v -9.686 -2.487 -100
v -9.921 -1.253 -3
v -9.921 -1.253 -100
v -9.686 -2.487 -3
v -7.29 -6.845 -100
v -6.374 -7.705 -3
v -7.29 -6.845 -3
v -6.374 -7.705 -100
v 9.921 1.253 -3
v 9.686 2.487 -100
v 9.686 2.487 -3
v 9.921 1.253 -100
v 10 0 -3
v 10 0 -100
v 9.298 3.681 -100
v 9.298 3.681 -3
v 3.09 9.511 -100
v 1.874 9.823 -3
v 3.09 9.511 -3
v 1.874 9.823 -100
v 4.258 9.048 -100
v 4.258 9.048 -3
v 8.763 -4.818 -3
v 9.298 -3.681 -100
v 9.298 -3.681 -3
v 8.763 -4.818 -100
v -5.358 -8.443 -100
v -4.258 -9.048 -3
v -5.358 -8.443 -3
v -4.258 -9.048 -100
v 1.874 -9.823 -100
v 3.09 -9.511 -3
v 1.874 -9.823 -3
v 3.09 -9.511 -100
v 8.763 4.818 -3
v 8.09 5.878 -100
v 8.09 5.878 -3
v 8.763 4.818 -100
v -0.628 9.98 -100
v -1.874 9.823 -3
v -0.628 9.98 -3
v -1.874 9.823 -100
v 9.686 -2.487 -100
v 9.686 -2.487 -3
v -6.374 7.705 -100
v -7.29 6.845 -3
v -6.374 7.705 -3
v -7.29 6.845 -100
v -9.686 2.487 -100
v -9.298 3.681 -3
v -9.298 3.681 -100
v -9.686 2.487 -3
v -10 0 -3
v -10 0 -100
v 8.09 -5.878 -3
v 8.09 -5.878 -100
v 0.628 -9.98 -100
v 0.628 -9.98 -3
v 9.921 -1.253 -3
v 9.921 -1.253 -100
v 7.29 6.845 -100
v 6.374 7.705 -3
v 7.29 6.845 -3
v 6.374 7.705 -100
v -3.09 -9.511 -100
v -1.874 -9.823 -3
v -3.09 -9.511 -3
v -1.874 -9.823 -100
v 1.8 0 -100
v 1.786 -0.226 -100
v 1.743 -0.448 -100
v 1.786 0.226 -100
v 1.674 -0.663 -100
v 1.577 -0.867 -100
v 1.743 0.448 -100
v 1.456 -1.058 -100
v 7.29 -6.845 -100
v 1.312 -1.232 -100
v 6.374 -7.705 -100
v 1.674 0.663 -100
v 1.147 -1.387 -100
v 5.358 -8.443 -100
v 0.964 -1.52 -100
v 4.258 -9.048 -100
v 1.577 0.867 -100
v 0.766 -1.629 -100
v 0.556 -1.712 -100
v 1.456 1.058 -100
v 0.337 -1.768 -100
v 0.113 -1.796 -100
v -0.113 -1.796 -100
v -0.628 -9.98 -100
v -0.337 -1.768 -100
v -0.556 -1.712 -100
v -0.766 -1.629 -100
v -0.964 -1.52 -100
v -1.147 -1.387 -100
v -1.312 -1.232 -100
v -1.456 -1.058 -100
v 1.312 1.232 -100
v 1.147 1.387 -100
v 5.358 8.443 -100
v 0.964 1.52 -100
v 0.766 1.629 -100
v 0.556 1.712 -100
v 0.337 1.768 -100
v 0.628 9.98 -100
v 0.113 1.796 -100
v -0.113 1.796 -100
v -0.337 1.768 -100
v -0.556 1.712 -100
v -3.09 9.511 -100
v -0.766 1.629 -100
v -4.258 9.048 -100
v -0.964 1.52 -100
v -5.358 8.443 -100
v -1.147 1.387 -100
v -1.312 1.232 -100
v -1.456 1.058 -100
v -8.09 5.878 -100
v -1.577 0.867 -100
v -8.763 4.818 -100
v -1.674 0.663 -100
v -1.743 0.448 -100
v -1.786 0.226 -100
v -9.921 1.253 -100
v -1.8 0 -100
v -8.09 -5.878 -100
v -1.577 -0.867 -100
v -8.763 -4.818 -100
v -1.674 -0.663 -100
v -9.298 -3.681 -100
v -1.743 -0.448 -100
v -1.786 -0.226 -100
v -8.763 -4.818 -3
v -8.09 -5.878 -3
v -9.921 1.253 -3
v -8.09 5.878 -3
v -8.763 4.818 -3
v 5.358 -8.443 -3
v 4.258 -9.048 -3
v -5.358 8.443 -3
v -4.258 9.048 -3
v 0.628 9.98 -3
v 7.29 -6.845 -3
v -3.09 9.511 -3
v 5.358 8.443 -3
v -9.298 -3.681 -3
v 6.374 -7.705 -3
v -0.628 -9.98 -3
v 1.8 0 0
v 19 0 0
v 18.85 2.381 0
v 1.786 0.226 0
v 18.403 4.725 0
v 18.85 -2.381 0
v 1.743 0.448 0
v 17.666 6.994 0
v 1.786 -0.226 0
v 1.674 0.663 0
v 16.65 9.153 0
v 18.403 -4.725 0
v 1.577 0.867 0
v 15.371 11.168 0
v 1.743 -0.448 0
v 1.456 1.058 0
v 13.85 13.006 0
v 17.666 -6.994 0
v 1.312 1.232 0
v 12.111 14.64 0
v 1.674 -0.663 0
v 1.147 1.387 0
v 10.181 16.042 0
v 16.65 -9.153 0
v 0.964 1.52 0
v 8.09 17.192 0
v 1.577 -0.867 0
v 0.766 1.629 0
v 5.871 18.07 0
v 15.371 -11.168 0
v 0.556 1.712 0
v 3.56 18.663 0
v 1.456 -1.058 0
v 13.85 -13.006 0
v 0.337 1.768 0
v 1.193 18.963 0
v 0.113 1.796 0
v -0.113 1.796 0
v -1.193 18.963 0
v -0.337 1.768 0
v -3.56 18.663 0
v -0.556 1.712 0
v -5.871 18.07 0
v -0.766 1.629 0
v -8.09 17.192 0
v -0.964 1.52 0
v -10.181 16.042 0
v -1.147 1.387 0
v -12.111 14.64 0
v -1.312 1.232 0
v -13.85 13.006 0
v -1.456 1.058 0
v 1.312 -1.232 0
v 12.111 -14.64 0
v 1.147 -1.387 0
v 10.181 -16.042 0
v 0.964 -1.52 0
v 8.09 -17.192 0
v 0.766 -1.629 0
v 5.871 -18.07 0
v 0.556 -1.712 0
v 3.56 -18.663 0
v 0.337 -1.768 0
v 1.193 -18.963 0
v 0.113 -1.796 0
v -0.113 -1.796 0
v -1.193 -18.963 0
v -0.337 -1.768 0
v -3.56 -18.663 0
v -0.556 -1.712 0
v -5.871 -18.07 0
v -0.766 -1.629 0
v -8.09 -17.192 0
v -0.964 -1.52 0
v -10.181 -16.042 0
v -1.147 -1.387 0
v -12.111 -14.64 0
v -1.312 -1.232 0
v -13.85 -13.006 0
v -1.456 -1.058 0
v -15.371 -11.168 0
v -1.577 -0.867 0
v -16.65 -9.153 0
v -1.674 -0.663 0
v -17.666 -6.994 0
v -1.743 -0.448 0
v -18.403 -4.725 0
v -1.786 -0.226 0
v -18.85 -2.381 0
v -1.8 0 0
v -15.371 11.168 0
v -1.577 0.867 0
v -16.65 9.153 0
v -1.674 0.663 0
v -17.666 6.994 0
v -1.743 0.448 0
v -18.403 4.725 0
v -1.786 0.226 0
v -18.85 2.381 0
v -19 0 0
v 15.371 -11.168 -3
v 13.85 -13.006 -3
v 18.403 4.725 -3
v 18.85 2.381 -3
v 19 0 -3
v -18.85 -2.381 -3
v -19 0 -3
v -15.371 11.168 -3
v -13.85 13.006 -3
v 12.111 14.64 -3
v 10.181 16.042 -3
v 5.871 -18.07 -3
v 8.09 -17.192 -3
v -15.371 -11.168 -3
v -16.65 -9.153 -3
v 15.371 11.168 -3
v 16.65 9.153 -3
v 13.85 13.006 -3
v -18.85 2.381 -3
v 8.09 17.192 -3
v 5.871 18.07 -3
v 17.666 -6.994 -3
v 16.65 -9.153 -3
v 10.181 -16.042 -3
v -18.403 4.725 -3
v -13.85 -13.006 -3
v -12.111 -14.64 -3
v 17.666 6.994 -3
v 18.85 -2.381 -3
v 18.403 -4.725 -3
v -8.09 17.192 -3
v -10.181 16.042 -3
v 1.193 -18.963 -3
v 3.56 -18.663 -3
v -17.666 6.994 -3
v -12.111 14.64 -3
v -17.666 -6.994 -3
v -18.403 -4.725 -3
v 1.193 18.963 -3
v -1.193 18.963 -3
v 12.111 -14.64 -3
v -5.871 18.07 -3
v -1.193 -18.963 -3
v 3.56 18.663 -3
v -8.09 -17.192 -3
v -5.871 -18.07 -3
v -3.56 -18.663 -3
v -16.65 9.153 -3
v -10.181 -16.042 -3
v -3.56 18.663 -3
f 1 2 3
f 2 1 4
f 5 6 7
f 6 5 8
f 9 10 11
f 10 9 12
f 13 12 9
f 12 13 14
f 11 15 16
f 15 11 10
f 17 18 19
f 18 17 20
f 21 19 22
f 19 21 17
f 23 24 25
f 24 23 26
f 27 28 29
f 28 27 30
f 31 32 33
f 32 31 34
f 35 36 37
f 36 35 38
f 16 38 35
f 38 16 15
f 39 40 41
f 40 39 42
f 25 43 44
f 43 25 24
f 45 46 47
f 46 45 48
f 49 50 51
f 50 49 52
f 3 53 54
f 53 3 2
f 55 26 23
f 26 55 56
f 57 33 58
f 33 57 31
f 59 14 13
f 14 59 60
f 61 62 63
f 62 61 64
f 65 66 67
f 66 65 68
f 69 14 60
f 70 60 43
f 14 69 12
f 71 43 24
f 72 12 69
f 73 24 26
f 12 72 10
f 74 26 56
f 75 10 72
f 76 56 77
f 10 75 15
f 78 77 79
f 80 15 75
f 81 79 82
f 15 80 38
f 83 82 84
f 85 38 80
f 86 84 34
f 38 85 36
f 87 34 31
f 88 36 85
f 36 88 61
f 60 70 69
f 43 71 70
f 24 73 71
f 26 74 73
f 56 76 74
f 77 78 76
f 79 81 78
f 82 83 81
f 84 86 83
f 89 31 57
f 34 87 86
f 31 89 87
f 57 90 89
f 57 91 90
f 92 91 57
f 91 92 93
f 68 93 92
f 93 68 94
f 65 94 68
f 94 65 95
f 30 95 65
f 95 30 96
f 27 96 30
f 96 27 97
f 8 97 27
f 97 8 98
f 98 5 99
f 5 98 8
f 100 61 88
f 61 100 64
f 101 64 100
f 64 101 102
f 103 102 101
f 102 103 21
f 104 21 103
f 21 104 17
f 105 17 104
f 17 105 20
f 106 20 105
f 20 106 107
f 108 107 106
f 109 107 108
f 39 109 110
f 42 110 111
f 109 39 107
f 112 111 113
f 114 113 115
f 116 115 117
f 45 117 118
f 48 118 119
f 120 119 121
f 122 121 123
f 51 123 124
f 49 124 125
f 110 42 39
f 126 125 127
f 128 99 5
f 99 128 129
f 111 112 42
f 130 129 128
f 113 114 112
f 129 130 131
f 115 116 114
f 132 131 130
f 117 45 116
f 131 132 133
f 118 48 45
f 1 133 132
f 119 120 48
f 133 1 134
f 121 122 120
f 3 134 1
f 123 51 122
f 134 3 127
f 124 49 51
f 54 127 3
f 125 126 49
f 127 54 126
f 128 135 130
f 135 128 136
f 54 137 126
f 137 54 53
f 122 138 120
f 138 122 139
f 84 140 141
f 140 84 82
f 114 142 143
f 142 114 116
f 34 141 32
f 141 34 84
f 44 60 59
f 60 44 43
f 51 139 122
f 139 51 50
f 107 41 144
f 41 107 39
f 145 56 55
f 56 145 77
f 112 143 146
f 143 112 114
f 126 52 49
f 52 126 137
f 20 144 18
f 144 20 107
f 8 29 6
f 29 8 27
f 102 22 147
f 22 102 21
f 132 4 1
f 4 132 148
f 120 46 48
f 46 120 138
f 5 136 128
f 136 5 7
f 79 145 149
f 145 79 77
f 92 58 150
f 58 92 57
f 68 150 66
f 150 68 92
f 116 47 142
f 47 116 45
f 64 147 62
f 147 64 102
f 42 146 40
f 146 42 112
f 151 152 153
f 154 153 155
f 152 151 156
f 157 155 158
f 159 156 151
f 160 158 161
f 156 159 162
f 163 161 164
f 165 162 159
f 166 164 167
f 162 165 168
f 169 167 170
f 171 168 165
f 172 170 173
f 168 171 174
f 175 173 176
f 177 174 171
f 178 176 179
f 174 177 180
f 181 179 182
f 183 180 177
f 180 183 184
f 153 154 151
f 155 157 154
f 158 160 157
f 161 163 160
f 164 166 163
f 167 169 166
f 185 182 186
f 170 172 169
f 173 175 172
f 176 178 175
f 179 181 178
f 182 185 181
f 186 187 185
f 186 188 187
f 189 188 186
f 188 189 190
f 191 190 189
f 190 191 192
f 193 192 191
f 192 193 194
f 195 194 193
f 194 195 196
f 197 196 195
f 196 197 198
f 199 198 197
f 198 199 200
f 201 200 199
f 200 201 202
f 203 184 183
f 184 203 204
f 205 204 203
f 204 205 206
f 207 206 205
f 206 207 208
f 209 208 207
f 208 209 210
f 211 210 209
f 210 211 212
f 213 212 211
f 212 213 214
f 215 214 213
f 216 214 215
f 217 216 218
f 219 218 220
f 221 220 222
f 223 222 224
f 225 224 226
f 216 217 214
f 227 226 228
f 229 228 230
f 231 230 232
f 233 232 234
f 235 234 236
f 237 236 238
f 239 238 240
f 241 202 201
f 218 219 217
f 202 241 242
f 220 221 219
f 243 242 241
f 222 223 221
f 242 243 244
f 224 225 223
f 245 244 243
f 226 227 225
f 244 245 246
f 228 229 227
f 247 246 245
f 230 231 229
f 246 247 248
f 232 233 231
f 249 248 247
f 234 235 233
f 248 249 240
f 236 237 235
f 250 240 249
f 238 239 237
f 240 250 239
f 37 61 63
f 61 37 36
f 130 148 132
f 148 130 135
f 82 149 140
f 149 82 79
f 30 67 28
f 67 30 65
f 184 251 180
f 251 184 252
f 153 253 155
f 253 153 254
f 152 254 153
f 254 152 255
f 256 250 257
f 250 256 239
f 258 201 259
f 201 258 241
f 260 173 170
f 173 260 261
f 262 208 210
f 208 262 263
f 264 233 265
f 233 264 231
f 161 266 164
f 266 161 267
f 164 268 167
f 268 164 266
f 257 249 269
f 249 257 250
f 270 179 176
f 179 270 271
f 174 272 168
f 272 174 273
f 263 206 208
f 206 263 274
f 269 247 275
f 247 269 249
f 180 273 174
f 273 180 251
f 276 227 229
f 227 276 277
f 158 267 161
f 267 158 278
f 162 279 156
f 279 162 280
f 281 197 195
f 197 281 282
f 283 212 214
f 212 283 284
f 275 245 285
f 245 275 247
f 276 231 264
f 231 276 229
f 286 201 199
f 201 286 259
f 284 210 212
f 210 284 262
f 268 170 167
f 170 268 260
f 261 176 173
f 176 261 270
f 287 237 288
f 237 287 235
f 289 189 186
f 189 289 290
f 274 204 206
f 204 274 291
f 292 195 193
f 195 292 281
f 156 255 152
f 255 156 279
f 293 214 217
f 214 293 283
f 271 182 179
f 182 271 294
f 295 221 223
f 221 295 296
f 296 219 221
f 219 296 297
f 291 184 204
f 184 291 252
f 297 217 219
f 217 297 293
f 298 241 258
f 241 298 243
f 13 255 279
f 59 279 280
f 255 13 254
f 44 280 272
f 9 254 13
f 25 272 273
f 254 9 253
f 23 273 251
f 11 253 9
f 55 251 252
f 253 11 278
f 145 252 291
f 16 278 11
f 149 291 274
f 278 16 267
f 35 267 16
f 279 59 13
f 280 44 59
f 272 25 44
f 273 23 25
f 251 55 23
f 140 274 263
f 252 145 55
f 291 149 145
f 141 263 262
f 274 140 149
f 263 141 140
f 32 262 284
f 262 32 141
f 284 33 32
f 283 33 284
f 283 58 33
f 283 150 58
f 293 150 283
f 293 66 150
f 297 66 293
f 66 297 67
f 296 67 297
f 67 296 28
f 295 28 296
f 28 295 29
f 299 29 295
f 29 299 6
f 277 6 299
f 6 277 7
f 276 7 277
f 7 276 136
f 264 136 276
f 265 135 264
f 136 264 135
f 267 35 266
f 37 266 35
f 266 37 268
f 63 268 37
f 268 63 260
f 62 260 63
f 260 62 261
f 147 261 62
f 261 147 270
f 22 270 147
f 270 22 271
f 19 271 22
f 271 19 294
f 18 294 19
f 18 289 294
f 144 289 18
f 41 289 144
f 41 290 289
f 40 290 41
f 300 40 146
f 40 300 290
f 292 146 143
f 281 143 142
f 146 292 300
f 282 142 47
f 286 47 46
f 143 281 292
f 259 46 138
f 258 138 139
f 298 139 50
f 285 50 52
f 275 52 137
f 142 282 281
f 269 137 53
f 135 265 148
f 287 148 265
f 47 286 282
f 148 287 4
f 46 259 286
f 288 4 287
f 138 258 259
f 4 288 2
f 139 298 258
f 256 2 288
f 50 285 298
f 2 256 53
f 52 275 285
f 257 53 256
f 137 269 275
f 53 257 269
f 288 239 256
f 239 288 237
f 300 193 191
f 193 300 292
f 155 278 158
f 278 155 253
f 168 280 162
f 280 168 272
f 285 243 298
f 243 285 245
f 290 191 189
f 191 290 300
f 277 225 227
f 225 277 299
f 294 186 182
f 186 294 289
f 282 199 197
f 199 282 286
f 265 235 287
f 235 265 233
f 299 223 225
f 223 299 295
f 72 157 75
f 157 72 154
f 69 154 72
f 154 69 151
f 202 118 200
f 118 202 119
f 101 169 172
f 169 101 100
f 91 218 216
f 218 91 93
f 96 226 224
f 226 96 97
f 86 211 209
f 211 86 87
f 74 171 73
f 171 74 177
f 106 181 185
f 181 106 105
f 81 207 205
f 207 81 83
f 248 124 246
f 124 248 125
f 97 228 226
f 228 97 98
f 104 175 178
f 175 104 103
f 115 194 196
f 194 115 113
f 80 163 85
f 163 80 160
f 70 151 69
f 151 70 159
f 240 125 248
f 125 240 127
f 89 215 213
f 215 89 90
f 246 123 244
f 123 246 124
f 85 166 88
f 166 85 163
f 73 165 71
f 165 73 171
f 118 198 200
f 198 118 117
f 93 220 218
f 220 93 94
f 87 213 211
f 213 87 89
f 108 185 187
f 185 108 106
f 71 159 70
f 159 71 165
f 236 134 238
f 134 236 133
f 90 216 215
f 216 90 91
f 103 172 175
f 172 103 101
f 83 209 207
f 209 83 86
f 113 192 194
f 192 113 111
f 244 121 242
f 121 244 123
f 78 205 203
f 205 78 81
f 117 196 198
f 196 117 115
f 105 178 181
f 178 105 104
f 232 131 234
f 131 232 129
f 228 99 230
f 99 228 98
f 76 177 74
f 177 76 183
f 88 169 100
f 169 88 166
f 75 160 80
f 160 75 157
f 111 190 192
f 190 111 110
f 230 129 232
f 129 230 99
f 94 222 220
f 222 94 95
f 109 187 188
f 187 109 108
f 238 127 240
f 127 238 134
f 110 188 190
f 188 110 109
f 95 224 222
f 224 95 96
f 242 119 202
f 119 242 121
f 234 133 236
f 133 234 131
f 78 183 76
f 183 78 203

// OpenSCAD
$fn = 50;


difference() {
	union() {
		translate(v = [0, 0, -100.0000000000]) {
			cylinder(h = 100, r = 10.0000000000);
		}
		translate(v = [0, 0, -3.0000000000]) {
			cylinder(h = 3, r = 19.0000000000);
		}
	}
	union() {
		#translate(v = [0, 0, -100]) {
			cylinder(h = 100, r = 1.8000000000);
		}
	}
}
